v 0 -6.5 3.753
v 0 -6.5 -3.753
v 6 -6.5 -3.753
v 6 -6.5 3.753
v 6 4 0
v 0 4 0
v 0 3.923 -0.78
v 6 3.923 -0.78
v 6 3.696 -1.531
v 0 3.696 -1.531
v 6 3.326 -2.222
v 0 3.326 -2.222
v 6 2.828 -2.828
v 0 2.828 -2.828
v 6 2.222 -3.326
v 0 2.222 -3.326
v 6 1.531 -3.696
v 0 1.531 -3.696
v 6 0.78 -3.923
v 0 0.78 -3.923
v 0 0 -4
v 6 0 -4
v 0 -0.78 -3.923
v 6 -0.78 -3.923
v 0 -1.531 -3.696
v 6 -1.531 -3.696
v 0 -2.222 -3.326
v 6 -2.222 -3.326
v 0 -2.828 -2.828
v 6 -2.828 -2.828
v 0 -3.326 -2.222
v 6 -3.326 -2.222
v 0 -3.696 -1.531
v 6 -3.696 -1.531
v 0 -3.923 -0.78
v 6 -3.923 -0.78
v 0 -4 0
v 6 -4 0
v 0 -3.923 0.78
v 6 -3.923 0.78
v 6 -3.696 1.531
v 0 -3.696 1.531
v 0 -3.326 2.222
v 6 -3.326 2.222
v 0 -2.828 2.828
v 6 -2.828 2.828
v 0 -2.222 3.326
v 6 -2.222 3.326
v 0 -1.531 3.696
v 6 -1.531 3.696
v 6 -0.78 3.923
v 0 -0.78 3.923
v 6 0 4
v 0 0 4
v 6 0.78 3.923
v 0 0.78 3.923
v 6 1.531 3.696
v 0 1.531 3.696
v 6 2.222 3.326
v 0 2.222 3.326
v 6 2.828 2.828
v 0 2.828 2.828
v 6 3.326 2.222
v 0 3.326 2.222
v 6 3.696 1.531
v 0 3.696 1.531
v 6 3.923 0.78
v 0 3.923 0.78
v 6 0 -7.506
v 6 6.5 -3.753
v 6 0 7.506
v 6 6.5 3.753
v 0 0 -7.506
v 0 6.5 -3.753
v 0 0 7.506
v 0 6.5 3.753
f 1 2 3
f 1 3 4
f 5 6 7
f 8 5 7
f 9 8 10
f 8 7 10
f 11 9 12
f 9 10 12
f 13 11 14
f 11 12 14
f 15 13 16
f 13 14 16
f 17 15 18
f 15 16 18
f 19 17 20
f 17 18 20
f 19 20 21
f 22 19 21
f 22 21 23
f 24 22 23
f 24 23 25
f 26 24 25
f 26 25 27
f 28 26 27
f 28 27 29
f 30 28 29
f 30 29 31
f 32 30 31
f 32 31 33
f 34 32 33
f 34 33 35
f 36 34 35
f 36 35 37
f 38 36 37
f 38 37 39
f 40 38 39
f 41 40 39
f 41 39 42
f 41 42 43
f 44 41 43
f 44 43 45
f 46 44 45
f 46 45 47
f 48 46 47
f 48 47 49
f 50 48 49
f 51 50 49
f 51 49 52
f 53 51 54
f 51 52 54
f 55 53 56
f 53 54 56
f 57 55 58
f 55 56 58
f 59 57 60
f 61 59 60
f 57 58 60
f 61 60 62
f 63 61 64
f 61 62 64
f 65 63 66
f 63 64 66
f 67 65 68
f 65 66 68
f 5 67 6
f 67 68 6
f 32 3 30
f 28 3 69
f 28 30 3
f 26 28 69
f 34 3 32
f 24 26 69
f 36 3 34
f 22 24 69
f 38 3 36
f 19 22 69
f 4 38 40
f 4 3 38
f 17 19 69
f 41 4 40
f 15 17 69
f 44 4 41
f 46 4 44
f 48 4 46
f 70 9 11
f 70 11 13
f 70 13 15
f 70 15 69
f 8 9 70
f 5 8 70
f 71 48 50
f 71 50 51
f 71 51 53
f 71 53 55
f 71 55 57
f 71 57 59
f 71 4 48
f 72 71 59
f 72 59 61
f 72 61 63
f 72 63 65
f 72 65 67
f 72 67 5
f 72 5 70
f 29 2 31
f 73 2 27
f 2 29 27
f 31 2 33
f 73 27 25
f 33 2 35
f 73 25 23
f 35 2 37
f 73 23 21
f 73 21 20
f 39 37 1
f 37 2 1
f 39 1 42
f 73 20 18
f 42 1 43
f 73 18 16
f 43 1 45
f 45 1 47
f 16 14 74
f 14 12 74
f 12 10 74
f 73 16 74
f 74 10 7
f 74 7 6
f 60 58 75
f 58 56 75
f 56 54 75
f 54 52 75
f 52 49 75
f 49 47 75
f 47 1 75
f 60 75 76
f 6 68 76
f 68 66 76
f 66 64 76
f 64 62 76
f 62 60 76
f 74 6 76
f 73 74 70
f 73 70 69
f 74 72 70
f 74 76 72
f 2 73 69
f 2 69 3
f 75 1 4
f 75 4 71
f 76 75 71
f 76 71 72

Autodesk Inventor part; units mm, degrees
ref_plane "YZ Plane" through (0, 0, 0) normal (1, 0, 0) x (0, 1, 0)
ref_plane "XZ Plane" through (0, 0, 0) normal (0, 1, 0) x (-1, 0, 0)
ref_plane "XY Plane" through (0, 0, 0) normal (0, 0, 1) x (1, 0, 0)
sketch "Sketch1" plane through (0, 0, 0) normal (1, 0, 0) x (0, 1, 0)
  line L0 (6.5, -3.7528) -> (0, -7.5056)
  line L1 (0, -7.5056) -> (-6.5, -3.7528)
  line L2 (-6.5, -3.7528) -> (-6.5, 3.7528)
  line L3 (-6.5, 3.7528) -> (0, 7.5056)
  line L4 (0, 7.5056) -> (6.5, 3.7528)
  line L5 (6.5, 3.7528) -> (6.5, -3.7528)
  line L6 (0, 10.5078) -> (0, -10.5078) projected
  circle A0 centre (0, 0) radius 4
  dimension "d0" = 6.5
  dimension "d1" = 8
extrude "Extrusion1" add sketch "Sketch1" along normal blind 6 contours L0 L6 A0 L4 L5 | L1 L2 L3 L6 A0
properties part number "OcM8"
